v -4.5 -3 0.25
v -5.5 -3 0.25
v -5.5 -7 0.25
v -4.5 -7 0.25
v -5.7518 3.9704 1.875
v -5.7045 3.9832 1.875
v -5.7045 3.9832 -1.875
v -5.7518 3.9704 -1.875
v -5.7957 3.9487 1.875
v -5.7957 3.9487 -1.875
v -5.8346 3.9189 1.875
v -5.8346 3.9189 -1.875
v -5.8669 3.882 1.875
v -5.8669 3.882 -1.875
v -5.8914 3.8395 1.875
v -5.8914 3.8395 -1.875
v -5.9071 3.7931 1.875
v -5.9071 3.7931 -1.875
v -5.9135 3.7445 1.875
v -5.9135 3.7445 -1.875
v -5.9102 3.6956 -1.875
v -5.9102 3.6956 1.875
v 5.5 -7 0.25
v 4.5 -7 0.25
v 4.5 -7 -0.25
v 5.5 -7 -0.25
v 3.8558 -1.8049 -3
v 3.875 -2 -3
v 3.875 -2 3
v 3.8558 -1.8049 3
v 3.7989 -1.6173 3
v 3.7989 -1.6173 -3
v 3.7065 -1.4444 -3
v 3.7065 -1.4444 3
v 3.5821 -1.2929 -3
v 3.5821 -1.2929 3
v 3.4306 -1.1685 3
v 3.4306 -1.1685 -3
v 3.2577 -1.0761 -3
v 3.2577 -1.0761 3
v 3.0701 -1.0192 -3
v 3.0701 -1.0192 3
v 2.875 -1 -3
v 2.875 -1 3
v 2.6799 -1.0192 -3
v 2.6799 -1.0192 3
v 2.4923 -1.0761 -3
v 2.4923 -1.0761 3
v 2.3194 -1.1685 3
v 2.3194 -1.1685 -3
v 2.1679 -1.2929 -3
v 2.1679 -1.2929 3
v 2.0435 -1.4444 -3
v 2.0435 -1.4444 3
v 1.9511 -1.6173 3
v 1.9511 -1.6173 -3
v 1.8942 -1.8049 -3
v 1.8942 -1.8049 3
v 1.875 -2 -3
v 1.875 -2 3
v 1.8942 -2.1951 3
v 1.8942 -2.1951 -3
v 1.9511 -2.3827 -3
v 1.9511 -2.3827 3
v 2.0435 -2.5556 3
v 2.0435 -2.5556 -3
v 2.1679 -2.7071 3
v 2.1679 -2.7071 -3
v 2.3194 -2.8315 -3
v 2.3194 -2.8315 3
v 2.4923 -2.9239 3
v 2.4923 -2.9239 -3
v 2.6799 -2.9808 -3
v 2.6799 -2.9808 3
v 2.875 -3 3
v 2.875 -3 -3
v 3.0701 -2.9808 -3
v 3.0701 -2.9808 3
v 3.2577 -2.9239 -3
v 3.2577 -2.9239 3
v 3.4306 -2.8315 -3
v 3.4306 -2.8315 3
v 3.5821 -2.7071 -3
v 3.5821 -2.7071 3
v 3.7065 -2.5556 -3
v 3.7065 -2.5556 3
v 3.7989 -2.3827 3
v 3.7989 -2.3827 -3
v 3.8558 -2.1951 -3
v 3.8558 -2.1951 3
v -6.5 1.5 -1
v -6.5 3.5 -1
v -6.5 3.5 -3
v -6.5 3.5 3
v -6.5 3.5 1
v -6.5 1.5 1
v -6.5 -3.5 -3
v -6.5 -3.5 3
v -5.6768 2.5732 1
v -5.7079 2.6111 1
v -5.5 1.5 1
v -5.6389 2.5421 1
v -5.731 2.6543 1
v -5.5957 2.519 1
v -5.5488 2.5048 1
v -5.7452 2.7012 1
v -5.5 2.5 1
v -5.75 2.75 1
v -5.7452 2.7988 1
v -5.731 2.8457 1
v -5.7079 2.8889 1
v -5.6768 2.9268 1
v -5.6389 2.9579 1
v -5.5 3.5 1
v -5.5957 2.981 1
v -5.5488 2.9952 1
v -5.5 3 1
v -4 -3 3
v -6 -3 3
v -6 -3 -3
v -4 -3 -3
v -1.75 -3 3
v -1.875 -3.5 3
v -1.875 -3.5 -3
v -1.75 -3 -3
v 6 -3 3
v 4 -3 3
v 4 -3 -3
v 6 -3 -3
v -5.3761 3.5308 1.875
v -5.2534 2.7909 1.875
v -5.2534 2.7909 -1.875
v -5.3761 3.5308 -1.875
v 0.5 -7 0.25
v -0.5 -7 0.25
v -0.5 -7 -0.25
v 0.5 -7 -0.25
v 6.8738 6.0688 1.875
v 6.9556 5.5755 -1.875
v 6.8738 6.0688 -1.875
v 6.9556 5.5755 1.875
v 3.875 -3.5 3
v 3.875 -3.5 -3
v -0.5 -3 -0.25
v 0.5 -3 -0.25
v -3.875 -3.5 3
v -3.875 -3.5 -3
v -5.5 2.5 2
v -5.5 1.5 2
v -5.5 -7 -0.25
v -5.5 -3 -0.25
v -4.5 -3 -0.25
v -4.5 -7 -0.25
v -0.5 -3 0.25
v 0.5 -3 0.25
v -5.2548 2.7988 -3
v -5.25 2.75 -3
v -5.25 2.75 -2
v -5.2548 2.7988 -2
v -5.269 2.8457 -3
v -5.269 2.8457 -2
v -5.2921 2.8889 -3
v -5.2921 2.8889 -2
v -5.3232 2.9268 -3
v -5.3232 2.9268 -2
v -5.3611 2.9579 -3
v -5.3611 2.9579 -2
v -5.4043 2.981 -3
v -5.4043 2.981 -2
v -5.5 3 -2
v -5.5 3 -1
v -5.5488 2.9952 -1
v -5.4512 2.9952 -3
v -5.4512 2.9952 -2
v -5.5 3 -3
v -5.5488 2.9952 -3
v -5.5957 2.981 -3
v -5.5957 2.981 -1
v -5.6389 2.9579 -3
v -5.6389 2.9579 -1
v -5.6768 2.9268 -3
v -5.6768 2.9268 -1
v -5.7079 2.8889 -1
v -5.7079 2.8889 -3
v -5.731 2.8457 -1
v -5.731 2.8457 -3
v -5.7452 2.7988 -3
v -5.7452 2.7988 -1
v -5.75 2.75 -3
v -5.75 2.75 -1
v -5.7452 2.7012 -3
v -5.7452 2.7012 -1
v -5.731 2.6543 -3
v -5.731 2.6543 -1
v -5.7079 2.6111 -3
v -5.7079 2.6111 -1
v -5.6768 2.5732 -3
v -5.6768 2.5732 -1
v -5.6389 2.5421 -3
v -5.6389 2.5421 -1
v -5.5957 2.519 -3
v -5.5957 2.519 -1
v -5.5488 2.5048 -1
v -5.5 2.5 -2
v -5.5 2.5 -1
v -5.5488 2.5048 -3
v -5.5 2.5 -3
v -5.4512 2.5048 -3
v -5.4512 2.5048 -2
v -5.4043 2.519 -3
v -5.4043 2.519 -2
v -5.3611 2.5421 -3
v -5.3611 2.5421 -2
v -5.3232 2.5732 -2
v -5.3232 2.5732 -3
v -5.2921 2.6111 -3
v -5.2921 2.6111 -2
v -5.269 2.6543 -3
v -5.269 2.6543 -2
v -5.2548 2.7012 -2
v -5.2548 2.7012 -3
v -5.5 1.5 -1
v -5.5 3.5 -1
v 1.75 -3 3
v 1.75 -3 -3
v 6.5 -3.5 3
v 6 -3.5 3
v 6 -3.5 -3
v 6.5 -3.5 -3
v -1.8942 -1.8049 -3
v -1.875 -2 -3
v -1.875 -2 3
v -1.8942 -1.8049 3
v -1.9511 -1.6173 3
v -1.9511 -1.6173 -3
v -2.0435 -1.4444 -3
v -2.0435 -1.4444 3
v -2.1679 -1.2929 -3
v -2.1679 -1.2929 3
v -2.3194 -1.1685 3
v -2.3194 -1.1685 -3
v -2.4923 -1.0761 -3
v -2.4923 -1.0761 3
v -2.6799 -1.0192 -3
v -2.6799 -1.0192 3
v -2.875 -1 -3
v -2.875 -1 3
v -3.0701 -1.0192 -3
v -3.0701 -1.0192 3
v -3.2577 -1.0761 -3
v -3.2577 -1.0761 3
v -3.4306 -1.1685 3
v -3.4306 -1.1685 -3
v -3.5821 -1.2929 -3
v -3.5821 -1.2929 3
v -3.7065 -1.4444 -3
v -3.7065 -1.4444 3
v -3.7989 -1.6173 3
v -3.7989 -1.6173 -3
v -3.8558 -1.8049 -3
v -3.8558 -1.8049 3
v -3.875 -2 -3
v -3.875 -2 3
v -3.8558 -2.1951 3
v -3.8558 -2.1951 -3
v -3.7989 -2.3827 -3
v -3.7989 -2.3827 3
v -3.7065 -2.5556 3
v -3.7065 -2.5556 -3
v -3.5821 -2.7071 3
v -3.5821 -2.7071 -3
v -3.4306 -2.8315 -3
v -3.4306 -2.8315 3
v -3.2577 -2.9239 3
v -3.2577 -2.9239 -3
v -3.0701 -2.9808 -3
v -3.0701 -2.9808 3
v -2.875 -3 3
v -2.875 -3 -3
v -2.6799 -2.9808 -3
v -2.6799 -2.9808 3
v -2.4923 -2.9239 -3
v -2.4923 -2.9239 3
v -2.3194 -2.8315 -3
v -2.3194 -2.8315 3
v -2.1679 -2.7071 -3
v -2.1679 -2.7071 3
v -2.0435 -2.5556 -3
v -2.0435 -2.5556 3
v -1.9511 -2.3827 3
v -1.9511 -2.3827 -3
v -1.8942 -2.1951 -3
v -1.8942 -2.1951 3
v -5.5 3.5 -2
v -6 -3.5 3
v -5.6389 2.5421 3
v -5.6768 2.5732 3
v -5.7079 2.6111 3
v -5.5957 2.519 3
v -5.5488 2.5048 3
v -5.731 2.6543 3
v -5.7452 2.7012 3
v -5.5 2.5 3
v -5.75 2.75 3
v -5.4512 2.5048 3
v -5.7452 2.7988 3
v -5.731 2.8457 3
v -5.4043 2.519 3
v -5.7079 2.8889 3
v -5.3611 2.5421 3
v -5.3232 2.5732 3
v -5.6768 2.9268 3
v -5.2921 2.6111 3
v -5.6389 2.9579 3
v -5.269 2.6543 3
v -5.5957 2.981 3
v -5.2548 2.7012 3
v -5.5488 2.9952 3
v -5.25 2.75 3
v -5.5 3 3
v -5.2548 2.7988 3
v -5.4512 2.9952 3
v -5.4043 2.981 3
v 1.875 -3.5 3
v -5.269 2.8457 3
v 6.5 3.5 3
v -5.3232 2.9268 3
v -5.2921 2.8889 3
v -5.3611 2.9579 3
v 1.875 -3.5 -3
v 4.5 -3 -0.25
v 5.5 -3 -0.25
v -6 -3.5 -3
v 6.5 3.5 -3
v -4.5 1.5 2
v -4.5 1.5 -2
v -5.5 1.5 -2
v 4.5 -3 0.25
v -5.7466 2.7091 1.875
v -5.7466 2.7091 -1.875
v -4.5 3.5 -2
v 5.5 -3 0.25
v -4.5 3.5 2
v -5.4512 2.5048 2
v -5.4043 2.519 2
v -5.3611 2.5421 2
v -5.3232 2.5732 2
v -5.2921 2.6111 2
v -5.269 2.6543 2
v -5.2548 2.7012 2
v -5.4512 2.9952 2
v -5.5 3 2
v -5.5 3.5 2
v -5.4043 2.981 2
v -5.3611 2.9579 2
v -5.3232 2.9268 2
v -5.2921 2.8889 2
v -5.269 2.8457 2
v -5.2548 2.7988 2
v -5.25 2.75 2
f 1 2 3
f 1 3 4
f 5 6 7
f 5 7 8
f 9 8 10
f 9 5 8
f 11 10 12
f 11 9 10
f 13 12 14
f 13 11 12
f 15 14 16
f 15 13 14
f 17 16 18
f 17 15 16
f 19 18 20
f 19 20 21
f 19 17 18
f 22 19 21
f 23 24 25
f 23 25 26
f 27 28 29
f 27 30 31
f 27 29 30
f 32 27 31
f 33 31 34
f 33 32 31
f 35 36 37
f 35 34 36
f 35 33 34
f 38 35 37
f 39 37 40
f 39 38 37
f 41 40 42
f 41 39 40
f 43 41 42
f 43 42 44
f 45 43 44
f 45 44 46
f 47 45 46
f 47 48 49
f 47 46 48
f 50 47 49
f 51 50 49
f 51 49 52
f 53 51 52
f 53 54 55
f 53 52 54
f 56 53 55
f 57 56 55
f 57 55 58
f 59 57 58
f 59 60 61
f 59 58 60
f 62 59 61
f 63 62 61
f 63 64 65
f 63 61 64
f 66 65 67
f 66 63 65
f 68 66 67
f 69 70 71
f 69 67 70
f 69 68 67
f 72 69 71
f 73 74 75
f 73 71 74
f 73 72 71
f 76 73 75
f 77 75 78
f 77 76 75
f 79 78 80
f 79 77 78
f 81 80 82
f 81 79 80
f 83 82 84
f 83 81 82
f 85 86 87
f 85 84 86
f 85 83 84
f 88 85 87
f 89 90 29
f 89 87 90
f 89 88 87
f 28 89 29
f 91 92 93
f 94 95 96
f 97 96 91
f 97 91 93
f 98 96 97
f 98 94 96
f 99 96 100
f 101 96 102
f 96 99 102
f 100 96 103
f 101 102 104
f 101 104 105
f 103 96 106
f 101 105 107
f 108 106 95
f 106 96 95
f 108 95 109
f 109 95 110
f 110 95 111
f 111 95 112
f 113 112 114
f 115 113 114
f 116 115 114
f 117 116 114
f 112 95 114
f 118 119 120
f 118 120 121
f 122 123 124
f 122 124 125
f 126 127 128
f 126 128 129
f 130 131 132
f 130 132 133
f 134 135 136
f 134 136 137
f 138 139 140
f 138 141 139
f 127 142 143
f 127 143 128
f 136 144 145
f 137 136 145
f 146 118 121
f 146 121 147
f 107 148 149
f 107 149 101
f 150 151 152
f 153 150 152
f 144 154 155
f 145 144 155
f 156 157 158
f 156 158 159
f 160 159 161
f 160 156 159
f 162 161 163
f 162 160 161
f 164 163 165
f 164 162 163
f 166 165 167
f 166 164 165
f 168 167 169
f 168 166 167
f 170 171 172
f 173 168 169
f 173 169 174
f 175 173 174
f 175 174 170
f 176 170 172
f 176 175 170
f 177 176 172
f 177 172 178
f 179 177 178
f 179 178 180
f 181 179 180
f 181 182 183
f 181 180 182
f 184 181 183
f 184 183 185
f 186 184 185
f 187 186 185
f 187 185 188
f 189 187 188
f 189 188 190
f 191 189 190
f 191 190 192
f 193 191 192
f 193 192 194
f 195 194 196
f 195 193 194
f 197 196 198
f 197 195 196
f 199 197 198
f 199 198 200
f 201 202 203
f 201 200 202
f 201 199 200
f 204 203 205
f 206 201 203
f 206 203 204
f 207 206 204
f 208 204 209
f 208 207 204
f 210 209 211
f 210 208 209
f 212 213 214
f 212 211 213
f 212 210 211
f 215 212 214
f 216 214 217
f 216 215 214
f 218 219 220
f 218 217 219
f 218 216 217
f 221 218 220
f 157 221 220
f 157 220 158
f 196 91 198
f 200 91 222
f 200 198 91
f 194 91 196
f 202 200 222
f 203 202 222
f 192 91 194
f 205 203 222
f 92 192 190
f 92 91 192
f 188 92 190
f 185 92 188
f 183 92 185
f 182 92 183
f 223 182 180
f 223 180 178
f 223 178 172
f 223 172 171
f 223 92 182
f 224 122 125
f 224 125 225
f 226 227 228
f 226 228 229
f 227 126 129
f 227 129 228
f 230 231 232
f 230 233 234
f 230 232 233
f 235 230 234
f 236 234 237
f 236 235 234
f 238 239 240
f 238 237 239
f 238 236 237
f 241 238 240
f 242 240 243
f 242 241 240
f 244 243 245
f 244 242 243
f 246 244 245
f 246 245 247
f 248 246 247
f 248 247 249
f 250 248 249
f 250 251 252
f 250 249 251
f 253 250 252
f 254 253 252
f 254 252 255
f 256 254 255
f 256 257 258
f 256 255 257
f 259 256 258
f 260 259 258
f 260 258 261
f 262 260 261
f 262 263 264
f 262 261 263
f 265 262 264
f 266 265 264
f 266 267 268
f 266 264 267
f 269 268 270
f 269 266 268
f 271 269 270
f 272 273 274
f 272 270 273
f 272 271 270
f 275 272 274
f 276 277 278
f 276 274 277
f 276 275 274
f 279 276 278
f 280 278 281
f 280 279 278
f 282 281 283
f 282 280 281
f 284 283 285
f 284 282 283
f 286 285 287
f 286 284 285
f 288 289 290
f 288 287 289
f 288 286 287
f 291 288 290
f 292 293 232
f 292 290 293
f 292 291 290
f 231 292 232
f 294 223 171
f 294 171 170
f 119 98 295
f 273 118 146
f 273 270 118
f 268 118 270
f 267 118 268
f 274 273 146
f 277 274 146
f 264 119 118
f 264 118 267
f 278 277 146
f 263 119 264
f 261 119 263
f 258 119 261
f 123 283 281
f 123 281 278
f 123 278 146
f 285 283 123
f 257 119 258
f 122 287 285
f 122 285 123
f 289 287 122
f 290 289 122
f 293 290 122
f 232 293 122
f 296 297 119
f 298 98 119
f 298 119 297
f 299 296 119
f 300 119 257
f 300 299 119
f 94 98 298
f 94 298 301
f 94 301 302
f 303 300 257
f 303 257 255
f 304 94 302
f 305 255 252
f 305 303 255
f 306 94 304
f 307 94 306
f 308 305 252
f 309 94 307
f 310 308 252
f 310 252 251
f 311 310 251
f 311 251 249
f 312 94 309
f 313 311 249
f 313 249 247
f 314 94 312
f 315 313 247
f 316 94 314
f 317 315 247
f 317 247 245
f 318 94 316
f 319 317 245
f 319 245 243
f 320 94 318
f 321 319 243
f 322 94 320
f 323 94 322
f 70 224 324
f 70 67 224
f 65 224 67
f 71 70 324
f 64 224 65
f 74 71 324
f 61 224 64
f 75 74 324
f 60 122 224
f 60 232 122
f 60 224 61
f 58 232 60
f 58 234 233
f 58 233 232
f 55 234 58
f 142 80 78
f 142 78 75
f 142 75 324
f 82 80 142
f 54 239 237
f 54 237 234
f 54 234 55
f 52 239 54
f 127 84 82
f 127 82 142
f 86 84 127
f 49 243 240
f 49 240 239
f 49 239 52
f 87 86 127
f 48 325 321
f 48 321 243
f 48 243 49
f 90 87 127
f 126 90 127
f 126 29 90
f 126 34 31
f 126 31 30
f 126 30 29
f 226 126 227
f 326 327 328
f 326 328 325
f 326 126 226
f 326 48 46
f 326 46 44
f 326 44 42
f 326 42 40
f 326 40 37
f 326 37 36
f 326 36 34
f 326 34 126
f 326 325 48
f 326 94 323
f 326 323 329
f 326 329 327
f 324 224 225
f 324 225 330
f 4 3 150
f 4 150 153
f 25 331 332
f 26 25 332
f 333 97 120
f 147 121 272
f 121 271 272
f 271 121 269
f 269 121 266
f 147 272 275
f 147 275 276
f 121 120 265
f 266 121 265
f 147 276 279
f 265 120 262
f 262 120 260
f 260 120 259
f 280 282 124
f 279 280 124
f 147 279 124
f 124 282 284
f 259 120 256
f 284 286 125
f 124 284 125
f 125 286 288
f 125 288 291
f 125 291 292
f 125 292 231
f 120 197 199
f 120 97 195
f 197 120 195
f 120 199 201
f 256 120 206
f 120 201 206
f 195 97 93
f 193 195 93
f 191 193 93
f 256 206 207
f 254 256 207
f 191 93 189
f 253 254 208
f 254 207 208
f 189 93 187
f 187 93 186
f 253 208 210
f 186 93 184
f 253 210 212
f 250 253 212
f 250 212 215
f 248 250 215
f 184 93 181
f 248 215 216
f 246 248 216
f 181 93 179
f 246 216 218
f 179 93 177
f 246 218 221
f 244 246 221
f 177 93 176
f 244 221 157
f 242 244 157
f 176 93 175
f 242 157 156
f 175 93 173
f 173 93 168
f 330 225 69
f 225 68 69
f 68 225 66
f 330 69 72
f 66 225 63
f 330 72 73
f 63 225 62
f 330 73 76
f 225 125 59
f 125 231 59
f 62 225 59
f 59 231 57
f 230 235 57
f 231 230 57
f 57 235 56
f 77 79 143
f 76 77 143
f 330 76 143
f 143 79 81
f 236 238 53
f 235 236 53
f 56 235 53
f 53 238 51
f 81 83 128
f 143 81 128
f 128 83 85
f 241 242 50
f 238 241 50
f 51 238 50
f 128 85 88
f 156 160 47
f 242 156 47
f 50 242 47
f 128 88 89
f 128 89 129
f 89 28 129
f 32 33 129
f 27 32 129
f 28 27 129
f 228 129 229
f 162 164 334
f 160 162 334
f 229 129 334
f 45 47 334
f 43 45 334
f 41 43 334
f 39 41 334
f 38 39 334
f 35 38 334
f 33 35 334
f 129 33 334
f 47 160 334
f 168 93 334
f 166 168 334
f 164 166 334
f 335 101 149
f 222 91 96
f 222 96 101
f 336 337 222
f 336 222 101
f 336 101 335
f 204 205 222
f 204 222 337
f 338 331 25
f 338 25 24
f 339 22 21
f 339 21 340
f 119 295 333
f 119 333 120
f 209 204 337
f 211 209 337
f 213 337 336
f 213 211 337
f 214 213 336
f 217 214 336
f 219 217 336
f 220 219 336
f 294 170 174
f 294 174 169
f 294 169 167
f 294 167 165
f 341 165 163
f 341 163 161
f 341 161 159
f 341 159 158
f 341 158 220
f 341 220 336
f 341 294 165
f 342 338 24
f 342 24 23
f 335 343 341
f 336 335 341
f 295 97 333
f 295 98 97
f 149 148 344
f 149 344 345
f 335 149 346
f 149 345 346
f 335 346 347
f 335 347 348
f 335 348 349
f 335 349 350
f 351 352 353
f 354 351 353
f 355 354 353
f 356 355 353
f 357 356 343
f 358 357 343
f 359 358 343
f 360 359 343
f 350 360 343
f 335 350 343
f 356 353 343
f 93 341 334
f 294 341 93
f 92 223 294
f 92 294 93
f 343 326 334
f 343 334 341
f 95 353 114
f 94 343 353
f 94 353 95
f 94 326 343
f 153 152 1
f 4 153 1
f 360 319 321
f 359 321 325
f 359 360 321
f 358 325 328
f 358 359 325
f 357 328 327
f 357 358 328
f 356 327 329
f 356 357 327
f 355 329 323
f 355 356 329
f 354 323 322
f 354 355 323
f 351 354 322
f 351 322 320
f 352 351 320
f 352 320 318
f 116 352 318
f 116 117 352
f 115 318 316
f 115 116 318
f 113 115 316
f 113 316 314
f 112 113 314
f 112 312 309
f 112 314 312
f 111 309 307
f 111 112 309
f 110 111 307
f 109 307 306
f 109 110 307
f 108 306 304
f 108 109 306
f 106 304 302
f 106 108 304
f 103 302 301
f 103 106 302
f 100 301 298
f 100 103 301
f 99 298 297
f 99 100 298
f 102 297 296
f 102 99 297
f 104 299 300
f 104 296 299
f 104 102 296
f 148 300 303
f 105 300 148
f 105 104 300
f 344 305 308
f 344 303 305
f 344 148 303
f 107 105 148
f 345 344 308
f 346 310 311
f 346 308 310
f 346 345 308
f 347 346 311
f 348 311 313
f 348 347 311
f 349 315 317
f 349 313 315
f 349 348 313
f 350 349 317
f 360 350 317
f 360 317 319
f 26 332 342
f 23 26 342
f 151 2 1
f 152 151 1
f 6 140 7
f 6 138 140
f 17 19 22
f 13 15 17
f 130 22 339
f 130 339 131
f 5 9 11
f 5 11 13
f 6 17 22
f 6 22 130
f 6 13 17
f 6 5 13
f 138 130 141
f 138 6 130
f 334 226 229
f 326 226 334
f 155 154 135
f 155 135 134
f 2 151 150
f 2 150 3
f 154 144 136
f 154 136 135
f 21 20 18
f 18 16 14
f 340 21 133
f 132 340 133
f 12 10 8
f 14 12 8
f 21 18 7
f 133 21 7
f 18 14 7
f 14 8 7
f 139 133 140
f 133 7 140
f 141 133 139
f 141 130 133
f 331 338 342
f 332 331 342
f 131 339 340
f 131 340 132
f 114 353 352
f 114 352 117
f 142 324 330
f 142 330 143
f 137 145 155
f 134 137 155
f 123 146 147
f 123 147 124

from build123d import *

# Parameters (mm, degrees)
BOSS_EXTRUDE1_DEPTH     = 3
CUT_EXTRUDE1_DEPTH      = 8.968688725
CUT_EXTRUDE1_DEPTH_BACK = 8.968688725
SKETCH2_R               = 1
SKETCH3_W               = 1
SKETCH3_H               = 0.5
BOSS_EXTRUDE2_DEPTH     = 4
BOSS_EXTRUDE2_2_DEPTH   = 4
BOSS_EXTRUDE2_3_DEPTH   = 4
CUT_EXTRUDE2_DEPTH      = 11.012492197
CUT_EXTRUDE2_DEPTH_BACK = 11.012492197
SKETCH5_R               = 0.25
SKETCH6_W               = 1
SKETCH6_H               = 4
SKETCH6_H_2             = 2
CUT_EXTRUDE3_DEPTH      = 2
BOSS_EXTRUDE3_DEPTH     = 1.875


with BuildPart() as part:
    # Sketch1 → Boss-Extrude1 (new, symmetric)
    with BuildSketch(Plane.XY):
        Polygon((-6.5, -3.5), (-6, -3.5), (-6, -3), (-4, -3), (-3.875, -3.5), (-1.875, -3.5), (-1.75, -3), (1.75, -3), (1.875, -3.5), (3.875, -3.5), (4, -3), (6, -3), (6, -3.5), (6.5, -3.5), (6.5, 3.5), (-6.5, 3.5), align=None)
    extrude(amount=BOSS_EXTRUDE1_DEPTH, both=True)

    # Sketch2 → Cut-Extrude1 (cut, two sides: drawn at the far end of the back side and taken through both)
    with BuildSketch(Plane.XY.offset(-CUT_EXTRUDE1_DEPTH_BACK)):
        with Locations((-2.875, -2)):
            Circle(SKETCH2_R)
        with Locations((2.875, -2)):
            Circle(SKETCH2_R)
    extrude(amount=CUT_EXTRUDE1_DEPTH + CUT_EXTRUDE1_DEPTH_BACK, mode=Mode.SUBTRACT)

    # Sketch5 → Cut-Extrude2 (cut, two sides: drawn at the far end of the back side and taken through both)
    with BuildSketch(Plane.XY.offset(-CUT_EXTRUDE2_DEPTH_BACK)):
        with Locations((-5.5, 2.75)):
            Circle(SKETCH5_R)
    extrude(amount=CUT_EXTRUDE2_DEPTH + CUT_EXTRUDE2_DEPTH_BACK, mode=Mode.SUBTRACT)

    # Sketch6 → Cut-Extrude3 (cut)
    with BuildSketch(Plane(origin=(0, 3.5, 0), x_dir=(1, 0, 0), z_dir=(0, 1, 0))):
        with Locations((-5, 0)):
            Rectangle(SKETCH6_W, SKETCH6_H)
        with Locations((-6, 0)):
            Rectangle(SKETCH6_W, SKETCH6_H_2)
    extrude(amount=-CUT_EXTRUDE3_DEPTH, mode=Mode.SUBTRACT)


with BuildPart() as body_2:
    # Sketch3 → Boss-Extrude2 (new body)
    with BuildSketch(Plane.XZ.offset(3)):
        Rectangle(SKETCH3_W, SKETCH3_H)
    extrude(amount=BOSS_EXTRUDE2_DEPTH)


with BuildPart() as body_3:
    # Sketch3 → Boss-Extrude2 2 (new body)
    with BuildSketch(Plane.XZ.offset(3)):
        with Locations((-5, 0)):
            Rectangle(SKETCH3_W, SKETCH3_H)
    extrude(amount=BOSS_EXTRUDE2_2_DEPTH)


with BuildPart() as body_4:
    # Sketch3 → Boss-Extrude2 3 (new body)
    with BuildSketch(Plane.XZ.offset(3)):
        with Locations((5, 0)):
            Rectangle(SKETCH3_W, SKETCH3_H)
    extrude(amount=BOSS_EXTRUDE2_3_DEPTH)


with BuildPart() as body_5:
    # Sketch4 → Boss-Extrude3 (new, symmetric)
    with BuildSketch(Plane.XY):
        with BuildLine():
            Line((6.873784044, 6.068805273), (-5.704474769, 3.983162629))
            ThreePointArc((-5.704474769, 3.983162629), (-5.866892446, 3.882008535), (-5.910212341, 3.695635149))
            Line((-5.910212341, 3.695635149), (-5.746632526, 2.709105046))
            Line((-5.746632526, 2.709105046), (-5.253367474, 2.790894954))
            Line((-5.253367474, 2.790894954), (-5.376052336, 3.530792531))
            Line((-5.376052336, 3.530792531), (6.955573951, 5.575540222))
            Line((6.955573951, 5.575540222), (6.873784044, 6.068805273))
        make_face()
    extrude(amount=BOSS_EXTRUDE3_DEPTH, both=True)


solid = Compound([part.part, body_2.part, body_3.part, body_4.part, body_5.part])
